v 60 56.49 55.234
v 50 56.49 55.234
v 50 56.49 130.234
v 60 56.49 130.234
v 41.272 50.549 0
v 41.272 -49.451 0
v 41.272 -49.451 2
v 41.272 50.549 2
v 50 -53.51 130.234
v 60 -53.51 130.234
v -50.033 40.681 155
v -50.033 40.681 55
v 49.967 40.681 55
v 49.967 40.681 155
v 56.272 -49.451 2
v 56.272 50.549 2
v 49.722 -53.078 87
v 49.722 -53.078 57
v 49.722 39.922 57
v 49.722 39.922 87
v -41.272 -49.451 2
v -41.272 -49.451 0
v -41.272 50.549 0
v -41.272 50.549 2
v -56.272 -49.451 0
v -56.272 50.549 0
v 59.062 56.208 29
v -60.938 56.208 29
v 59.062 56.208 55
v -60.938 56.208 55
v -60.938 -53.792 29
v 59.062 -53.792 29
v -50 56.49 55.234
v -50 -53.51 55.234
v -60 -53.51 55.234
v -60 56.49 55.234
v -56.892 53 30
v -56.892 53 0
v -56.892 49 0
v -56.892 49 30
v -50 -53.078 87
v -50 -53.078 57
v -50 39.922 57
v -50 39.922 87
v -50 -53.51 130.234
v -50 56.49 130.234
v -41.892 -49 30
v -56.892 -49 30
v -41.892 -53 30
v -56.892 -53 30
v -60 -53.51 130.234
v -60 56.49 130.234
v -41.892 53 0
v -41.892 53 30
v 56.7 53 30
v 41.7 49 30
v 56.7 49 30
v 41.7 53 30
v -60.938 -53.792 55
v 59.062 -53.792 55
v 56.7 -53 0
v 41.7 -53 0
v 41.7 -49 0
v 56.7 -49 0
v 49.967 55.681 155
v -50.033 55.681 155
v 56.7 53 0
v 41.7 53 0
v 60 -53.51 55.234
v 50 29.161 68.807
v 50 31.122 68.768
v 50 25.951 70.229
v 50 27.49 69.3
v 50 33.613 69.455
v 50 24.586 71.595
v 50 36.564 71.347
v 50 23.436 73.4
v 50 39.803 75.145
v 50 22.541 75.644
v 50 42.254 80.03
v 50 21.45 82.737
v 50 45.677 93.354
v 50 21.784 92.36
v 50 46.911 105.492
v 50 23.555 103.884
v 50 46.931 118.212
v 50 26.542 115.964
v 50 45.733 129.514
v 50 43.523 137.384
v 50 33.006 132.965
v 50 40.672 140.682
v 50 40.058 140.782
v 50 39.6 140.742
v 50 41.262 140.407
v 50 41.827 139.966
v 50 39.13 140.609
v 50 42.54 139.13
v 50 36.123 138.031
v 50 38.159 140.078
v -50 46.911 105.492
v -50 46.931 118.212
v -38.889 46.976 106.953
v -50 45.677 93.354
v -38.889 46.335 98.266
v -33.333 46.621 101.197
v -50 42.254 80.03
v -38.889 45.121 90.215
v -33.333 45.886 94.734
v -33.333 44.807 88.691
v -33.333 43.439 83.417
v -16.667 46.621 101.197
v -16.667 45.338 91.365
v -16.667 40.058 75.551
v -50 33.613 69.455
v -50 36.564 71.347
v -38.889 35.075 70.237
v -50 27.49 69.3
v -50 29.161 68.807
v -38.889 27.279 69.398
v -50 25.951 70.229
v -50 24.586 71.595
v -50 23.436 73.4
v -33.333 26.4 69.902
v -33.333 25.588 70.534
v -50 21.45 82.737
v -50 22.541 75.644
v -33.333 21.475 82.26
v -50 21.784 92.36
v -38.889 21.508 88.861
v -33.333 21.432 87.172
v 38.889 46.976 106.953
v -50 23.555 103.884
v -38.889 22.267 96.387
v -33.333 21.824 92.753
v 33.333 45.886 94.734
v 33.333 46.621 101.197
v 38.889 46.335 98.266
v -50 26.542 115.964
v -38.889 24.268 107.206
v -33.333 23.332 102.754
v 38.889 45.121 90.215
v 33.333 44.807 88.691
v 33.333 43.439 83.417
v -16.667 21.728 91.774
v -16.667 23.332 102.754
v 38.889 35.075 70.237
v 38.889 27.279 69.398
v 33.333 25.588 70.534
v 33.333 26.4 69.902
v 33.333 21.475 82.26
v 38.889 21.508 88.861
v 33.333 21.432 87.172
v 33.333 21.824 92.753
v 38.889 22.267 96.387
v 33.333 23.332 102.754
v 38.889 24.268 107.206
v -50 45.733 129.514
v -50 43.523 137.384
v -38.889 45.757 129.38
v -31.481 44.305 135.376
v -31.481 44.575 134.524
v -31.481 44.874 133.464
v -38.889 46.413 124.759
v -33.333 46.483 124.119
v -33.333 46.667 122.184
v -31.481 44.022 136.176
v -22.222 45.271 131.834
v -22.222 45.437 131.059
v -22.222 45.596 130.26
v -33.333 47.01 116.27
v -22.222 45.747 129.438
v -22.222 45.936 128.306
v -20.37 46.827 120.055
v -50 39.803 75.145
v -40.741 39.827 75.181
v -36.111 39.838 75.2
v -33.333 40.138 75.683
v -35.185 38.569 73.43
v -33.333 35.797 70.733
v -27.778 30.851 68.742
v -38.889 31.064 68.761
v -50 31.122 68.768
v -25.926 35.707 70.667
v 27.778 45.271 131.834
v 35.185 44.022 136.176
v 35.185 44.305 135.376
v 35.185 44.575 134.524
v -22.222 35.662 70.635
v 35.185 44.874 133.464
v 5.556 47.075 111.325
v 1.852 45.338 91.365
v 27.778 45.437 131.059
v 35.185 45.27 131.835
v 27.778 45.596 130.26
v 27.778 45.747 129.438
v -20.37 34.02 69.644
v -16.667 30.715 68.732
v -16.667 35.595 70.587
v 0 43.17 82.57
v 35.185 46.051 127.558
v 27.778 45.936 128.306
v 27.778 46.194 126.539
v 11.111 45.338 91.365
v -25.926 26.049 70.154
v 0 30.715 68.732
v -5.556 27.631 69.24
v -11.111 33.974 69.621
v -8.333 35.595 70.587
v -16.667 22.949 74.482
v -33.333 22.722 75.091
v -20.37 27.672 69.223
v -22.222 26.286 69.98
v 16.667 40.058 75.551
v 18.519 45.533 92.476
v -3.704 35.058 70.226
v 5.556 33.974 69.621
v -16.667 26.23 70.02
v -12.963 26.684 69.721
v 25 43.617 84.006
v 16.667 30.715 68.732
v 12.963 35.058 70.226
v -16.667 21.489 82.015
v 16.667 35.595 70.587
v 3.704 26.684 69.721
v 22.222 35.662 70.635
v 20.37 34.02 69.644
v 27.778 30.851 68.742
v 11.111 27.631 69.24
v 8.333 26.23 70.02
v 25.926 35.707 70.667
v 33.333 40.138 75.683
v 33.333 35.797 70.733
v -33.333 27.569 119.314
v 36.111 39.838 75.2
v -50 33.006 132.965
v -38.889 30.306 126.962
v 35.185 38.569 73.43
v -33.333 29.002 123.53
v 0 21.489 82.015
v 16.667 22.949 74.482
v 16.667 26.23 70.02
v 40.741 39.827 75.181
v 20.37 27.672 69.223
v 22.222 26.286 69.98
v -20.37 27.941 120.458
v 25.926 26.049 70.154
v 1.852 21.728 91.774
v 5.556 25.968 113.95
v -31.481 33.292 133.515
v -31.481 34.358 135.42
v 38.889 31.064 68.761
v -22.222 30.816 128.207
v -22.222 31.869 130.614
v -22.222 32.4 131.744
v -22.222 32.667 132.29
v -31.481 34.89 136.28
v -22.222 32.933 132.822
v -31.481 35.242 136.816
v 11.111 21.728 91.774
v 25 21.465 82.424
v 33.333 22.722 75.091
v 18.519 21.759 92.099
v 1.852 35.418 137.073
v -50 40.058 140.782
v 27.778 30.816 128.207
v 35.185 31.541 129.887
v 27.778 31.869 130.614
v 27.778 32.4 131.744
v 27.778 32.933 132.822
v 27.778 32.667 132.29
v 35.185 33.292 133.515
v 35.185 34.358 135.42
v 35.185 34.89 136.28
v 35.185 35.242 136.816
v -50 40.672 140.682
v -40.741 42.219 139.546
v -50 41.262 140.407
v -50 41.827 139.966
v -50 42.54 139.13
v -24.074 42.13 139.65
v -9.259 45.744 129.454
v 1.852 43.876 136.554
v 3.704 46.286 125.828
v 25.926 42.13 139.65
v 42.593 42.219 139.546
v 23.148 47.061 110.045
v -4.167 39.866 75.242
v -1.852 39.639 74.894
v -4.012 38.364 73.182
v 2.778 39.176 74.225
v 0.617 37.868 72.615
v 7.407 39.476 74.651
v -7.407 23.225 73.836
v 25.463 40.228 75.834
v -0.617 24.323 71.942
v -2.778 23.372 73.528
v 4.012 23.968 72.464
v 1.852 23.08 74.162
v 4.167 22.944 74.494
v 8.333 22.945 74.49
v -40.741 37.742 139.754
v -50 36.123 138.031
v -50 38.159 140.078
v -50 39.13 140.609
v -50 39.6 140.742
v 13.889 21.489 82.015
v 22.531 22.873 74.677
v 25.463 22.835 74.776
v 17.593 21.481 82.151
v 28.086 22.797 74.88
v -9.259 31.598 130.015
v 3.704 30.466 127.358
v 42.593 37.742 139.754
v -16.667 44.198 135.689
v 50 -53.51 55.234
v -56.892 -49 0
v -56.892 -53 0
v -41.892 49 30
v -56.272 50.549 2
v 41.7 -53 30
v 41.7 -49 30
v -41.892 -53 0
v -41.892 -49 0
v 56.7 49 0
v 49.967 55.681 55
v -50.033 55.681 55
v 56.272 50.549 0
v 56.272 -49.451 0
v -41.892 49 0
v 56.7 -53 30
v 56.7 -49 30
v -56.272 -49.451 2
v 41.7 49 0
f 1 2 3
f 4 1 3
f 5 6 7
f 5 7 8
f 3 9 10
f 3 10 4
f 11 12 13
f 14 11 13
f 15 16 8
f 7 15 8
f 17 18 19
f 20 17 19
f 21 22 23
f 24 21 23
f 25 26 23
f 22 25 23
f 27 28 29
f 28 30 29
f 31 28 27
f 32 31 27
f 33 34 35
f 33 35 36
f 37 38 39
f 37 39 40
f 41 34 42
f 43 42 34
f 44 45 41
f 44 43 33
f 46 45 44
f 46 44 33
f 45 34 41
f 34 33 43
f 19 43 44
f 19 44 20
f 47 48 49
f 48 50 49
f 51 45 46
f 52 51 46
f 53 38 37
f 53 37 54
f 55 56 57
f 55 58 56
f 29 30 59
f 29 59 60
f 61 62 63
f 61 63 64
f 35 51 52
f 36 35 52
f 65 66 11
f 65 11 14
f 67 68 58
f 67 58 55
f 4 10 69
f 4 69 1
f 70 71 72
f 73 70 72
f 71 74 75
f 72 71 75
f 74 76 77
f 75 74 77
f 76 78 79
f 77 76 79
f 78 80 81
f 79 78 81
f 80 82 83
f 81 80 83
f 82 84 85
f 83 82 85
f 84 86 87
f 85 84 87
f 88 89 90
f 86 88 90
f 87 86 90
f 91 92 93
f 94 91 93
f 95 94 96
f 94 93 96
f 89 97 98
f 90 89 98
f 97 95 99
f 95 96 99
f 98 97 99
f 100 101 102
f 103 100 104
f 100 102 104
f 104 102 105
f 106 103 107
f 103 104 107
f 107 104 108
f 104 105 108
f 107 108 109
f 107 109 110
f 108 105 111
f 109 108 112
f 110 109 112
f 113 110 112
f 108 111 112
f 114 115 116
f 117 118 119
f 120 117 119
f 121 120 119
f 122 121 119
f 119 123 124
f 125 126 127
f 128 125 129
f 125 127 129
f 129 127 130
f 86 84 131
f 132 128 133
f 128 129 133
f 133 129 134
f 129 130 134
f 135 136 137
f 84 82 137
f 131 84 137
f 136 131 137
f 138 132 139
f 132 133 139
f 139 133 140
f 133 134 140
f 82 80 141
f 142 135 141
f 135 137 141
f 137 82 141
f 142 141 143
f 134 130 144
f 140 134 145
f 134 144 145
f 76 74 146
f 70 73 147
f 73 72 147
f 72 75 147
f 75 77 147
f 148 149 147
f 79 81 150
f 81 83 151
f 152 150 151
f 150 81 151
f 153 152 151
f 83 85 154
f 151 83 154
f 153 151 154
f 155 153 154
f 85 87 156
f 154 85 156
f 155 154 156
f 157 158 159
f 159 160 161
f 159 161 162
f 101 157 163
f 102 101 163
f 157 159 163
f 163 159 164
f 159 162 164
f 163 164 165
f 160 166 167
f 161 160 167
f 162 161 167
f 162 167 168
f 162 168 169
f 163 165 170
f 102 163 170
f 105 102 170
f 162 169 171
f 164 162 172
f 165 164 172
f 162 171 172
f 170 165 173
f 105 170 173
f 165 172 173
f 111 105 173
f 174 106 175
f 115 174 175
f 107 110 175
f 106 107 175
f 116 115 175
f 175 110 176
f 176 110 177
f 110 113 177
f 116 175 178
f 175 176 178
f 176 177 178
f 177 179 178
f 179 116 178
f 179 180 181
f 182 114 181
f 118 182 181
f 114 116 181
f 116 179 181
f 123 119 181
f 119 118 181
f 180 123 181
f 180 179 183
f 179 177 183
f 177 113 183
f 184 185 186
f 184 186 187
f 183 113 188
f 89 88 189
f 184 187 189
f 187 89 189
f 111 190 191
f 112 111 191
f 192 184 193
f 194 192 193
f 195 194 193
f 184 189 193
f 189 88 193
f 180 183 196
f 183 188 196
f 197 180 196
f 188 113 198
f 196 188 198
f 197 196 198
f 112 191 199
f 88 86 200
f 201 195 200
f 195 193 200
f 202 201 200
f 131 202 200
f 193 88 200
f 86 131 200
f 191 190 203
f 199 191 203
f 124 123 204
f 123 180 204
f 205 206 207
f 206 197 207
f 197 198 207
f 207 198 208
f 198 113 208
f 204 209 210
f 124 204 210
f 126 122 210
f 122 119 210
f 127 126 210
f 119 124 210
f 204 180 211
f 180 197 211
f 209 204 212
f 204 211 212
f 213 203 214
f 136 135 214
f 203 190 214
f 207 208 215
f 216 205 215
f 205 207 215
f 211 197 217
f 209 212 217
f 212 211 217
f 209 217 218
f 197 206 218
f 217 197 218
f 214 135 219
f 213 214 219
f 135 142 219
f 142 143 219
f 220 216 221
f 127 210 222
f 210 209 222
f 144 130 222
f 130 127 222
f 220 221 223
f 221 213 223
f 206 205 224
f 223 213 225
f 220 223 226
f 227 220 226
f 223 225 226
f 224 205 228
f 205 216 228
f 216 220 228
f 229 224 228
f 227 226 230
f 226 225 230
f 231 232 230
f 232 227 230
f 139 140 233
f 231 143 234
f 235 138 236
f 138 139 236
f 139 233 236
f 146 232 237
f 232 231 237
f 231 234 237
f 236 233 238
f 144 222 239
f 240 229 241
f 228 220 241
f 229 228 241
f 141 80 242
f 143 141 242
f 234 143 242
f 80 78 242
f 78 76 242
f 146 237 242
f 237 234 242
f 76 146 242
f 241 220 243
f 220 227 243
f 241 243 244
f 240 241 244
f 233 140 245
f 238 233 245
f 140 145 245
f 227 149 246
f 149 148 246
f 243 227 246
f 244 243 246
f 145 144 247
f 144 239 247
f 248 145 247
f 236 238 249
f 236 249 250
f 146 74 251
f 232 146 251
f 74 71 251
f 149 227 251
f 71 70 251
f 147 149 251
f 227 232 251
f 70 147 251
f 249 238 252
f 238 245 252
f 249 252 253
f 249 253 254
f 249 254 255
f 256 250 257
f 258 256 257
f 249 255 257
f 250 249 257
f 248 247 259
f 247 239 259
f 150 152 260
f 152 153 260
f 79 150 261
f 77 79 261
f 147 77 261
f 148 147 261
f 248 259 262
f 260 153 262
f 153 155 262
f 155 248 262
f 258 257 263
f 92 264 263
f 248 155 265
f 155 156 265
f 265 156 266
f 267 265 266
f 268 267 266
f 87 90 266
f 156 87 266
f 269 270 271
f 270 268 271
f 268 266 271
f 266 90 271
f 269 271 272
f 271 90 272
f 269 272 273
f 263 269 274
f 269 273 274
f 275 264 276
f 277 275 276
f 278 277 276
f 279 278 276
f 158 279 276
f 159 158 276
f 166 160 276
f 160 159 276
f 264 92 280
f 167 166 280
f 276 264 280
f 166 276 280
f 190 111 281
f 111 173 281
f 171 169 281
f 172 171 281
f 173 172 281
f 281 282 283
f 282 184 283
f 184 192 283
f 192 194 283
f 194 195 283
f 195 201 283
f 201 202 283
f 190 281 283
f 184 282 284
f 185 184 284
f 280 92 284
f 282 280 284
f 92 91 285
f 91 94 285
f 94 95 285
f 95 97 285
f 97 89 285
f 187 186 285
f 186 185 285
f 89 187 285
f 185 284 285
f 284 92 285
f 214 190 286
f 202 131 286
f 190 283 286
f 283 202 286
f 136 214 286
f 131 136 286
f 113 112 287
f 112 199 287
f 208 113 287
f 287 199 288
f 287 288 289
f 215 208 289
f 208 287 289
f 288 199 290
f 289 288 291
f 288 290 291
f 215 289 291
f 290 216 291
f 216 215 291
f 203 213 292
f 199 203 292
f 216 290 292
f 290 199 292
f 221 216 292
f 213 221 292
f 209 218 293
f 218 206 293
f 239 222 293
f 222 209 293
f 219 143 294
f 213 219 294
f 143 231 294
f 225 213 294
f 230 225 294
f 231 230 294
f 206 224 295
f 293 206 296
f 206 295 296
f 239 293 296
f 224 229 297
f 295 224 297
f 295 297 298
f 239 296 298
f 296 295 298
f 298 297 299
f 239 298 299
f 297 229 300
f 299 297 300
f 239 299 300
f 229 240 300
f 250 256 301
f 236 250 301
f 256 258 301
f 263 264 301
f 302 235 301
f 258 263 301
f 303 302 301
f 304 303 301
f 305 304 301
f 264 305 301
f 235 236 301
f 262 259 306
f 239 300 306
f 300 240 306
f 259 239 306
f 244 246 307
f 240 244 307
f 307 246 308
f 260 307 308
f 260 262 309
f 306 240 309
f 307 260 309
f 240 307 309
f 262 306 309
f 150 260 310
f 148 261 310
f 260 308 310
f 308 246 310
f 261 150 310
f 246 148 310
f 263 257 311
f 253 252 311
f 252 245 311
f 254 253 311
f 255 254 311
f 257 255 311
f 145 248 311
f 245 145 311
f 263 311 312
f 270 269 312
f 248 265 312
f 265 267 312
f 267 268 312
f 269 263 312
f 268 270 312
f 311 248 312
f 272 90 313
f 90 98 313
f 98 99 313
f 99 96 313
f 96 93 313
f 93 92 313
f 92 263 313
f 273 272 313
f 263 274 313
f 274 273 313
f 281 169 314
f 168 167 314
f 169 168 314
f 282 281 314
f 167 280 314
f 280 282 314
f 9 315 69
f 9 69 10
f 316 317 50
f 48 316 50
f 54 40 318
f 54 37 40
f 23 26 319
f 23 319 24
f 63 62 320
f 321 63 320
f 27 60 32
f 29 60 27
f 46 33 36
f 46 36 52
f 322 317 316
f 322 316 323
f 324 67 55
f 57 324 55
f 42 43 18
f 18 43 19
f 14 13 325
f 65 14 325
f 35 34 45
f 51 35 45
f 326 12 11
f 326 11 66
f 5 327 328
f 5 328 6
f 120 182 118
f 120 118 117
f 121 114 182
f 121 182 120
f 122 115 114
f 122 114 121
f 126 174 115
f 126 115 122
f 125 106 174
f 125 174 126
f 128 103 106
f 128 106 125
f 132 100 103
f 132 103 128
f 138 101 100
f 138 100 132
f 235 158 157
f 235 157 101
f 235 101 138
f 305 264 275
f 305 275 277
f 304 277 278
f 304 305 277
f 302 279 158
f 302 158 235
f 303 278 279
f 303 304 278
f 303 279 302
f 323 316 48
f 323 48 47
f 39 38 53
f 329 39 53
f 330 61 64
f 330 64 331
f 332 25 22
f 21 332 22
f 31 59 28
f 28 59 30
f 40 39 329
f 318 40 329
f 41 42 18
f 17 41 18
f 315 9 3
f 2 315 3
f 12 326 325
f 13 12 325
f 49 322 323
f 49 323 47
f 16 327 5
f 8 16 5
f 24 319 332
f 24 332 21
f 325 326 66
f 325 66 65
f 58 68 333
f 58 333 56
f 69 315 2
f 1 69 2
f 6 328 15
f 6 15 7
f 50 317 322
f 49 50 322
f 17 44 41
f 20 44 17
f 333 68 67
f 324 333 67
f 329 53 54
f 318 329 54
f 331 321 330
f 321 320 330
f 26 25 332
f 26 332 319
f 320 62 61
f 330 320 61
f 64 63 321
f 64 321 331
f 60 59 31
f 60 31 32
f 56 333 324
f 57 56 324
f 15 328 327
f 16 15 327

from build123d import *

# Parameters (mm, degrees)
F0_W          = 15
F0_H          = 100
F1_DEPTH      = 2
F4_W          = 15
F4_H          = 30
F5_DEPTH      = 3
F5_DEPTH_BACK = 1
F8_W          = 120
F8_H          = 110
F9_DEPTH      = 25
F9_DEPTH_BACK = 1
F11_W         = 110
F11_H         = 75
F12_DEPTH     = 10
F15_W         = 100
F15_H         = 15
F16_DEPTH     = 100
F18_W         = 100
F18_H         = 93
F19_DEPTH     = 30
F21_DEPTH     = 100


with BuildPart() as f1:
    # F0 (on Top) → F1 (new body)
    with BuildSketch(Plane.XY):
        with Locations((-48.772149086, 0.5487196147)):
            Rectangle(F0_W, F0_H)
    extrude(amount=F1_DEPTH)


with BuildPart() as f2_1:
    # F2: instance of F1
    add(f1.part.mirror(Plane.YZ))


with BuildPart() as f5:
    # F4 (on offset) → F5 (new body, two sides)
    with BuildSketch(Plane.XZ.offset(50)) as f5_sk:
        with Locations((-49.3922273815, 15)):
            Rectangle(F4_W, F4_H)
    extrude(amount=F5_DEPTH)
    extrude(f5_sk.sketch, amount=-F5_DEPTH_BACK)


with BuildPart() as f5b:
    # F4 (on offset) → F5, piece 2 (new body, two sides)
    with BuildSketch(Plane.XZ.offset(50)) as f5_2_sk:
        with Locations((49.2002998292, 15)):
            Rectangle(F4_W, F4_H)
    extrude(amount=F5_DEPTH)
    extrude(f5_2_sk.sketch, amount=-F5_DEPTH_BACK)


with BuildPart() as f6_1:
    # F6: instance of F5
    add(f5.part.mirror(Plane.XZ))


with BuildPart() as f6_2:
    # F6: instance of F5b
    add(f5b.part.mirror(Plane.XZ))


with BuildPart() as f9:
    # F8 (on offset) → F9 (new body, two sides)
    with BuildSketch(Plane.XY.offset(30)) as f9_sk:
        with Locations((-0.937500447, 1.2081678212)):
            Rectangle(F8_W, F8_H)
    extrude(amount=F9_DEPTH)
    extrude(f9_sk.sketch, amount=-F9_DEPTH_BACK)


with BuildPart() as f12:
    # F11 (on offset) → F12 (new body)
    with BuildSketch(Plane.YZ.offset(50)):
        with Locations((1.4902095497, 92.7335903049)):
            Rectangle(F11_W, F11_H)
    extrude(amount=F12_DEPTH)


with BuildPart() as f13_1:
    # F13: instance of F12
    add(f12.part.mirror(Plane.YZ))

    # F18 (on offset) → F19 (join)
    with BuildSketch(Plane.XY.offset(57)):
        with Locations((-0.2780973911, -6.5783124268)):
            Rectangle(F18_W, F18_H)
    extrude(amount=F19_DEPTH)


with BuildPart() as f16:
    # F15 (on offset) → F16 (new body)
    with BuildSketch(Plane.XY.offset(55)):
        with Locations((-0.0332251191, 48.1811274588)):
            Rectangle(F15_W, F15_H)
    extrude(amount=F16_DEPTH)


with BuildPart() as f21:
    # F20 (on offset) → F21 (new body)
    with BuildSketch(Plane.YZ.offset(50)):
        with BuildLine():
            add(Edge.make_bspline(
                [(40.0582775474, 140.7815366983), (48.3531423096, 140.6496717235), (51.4865046204, 67.7875403882), (9.0076107088, 65.4651675986), (31.5598154189, 140.9166382976), (40.0582775474, 140.7815366983)],
                knots=[0, 0, 0, 0, 0.3941365181, 0.5961894053, 1, 1, 1, 1], degree=3))
        make_face()
    extrude(amount=-F21_DEPTH)


solid = Compound([f1.part, f2_1.part, f5.part, f5b.part, f6_1.part, f6_2.part, f9.part, f12.part, f13_1.part, f16.part, f21.part])
